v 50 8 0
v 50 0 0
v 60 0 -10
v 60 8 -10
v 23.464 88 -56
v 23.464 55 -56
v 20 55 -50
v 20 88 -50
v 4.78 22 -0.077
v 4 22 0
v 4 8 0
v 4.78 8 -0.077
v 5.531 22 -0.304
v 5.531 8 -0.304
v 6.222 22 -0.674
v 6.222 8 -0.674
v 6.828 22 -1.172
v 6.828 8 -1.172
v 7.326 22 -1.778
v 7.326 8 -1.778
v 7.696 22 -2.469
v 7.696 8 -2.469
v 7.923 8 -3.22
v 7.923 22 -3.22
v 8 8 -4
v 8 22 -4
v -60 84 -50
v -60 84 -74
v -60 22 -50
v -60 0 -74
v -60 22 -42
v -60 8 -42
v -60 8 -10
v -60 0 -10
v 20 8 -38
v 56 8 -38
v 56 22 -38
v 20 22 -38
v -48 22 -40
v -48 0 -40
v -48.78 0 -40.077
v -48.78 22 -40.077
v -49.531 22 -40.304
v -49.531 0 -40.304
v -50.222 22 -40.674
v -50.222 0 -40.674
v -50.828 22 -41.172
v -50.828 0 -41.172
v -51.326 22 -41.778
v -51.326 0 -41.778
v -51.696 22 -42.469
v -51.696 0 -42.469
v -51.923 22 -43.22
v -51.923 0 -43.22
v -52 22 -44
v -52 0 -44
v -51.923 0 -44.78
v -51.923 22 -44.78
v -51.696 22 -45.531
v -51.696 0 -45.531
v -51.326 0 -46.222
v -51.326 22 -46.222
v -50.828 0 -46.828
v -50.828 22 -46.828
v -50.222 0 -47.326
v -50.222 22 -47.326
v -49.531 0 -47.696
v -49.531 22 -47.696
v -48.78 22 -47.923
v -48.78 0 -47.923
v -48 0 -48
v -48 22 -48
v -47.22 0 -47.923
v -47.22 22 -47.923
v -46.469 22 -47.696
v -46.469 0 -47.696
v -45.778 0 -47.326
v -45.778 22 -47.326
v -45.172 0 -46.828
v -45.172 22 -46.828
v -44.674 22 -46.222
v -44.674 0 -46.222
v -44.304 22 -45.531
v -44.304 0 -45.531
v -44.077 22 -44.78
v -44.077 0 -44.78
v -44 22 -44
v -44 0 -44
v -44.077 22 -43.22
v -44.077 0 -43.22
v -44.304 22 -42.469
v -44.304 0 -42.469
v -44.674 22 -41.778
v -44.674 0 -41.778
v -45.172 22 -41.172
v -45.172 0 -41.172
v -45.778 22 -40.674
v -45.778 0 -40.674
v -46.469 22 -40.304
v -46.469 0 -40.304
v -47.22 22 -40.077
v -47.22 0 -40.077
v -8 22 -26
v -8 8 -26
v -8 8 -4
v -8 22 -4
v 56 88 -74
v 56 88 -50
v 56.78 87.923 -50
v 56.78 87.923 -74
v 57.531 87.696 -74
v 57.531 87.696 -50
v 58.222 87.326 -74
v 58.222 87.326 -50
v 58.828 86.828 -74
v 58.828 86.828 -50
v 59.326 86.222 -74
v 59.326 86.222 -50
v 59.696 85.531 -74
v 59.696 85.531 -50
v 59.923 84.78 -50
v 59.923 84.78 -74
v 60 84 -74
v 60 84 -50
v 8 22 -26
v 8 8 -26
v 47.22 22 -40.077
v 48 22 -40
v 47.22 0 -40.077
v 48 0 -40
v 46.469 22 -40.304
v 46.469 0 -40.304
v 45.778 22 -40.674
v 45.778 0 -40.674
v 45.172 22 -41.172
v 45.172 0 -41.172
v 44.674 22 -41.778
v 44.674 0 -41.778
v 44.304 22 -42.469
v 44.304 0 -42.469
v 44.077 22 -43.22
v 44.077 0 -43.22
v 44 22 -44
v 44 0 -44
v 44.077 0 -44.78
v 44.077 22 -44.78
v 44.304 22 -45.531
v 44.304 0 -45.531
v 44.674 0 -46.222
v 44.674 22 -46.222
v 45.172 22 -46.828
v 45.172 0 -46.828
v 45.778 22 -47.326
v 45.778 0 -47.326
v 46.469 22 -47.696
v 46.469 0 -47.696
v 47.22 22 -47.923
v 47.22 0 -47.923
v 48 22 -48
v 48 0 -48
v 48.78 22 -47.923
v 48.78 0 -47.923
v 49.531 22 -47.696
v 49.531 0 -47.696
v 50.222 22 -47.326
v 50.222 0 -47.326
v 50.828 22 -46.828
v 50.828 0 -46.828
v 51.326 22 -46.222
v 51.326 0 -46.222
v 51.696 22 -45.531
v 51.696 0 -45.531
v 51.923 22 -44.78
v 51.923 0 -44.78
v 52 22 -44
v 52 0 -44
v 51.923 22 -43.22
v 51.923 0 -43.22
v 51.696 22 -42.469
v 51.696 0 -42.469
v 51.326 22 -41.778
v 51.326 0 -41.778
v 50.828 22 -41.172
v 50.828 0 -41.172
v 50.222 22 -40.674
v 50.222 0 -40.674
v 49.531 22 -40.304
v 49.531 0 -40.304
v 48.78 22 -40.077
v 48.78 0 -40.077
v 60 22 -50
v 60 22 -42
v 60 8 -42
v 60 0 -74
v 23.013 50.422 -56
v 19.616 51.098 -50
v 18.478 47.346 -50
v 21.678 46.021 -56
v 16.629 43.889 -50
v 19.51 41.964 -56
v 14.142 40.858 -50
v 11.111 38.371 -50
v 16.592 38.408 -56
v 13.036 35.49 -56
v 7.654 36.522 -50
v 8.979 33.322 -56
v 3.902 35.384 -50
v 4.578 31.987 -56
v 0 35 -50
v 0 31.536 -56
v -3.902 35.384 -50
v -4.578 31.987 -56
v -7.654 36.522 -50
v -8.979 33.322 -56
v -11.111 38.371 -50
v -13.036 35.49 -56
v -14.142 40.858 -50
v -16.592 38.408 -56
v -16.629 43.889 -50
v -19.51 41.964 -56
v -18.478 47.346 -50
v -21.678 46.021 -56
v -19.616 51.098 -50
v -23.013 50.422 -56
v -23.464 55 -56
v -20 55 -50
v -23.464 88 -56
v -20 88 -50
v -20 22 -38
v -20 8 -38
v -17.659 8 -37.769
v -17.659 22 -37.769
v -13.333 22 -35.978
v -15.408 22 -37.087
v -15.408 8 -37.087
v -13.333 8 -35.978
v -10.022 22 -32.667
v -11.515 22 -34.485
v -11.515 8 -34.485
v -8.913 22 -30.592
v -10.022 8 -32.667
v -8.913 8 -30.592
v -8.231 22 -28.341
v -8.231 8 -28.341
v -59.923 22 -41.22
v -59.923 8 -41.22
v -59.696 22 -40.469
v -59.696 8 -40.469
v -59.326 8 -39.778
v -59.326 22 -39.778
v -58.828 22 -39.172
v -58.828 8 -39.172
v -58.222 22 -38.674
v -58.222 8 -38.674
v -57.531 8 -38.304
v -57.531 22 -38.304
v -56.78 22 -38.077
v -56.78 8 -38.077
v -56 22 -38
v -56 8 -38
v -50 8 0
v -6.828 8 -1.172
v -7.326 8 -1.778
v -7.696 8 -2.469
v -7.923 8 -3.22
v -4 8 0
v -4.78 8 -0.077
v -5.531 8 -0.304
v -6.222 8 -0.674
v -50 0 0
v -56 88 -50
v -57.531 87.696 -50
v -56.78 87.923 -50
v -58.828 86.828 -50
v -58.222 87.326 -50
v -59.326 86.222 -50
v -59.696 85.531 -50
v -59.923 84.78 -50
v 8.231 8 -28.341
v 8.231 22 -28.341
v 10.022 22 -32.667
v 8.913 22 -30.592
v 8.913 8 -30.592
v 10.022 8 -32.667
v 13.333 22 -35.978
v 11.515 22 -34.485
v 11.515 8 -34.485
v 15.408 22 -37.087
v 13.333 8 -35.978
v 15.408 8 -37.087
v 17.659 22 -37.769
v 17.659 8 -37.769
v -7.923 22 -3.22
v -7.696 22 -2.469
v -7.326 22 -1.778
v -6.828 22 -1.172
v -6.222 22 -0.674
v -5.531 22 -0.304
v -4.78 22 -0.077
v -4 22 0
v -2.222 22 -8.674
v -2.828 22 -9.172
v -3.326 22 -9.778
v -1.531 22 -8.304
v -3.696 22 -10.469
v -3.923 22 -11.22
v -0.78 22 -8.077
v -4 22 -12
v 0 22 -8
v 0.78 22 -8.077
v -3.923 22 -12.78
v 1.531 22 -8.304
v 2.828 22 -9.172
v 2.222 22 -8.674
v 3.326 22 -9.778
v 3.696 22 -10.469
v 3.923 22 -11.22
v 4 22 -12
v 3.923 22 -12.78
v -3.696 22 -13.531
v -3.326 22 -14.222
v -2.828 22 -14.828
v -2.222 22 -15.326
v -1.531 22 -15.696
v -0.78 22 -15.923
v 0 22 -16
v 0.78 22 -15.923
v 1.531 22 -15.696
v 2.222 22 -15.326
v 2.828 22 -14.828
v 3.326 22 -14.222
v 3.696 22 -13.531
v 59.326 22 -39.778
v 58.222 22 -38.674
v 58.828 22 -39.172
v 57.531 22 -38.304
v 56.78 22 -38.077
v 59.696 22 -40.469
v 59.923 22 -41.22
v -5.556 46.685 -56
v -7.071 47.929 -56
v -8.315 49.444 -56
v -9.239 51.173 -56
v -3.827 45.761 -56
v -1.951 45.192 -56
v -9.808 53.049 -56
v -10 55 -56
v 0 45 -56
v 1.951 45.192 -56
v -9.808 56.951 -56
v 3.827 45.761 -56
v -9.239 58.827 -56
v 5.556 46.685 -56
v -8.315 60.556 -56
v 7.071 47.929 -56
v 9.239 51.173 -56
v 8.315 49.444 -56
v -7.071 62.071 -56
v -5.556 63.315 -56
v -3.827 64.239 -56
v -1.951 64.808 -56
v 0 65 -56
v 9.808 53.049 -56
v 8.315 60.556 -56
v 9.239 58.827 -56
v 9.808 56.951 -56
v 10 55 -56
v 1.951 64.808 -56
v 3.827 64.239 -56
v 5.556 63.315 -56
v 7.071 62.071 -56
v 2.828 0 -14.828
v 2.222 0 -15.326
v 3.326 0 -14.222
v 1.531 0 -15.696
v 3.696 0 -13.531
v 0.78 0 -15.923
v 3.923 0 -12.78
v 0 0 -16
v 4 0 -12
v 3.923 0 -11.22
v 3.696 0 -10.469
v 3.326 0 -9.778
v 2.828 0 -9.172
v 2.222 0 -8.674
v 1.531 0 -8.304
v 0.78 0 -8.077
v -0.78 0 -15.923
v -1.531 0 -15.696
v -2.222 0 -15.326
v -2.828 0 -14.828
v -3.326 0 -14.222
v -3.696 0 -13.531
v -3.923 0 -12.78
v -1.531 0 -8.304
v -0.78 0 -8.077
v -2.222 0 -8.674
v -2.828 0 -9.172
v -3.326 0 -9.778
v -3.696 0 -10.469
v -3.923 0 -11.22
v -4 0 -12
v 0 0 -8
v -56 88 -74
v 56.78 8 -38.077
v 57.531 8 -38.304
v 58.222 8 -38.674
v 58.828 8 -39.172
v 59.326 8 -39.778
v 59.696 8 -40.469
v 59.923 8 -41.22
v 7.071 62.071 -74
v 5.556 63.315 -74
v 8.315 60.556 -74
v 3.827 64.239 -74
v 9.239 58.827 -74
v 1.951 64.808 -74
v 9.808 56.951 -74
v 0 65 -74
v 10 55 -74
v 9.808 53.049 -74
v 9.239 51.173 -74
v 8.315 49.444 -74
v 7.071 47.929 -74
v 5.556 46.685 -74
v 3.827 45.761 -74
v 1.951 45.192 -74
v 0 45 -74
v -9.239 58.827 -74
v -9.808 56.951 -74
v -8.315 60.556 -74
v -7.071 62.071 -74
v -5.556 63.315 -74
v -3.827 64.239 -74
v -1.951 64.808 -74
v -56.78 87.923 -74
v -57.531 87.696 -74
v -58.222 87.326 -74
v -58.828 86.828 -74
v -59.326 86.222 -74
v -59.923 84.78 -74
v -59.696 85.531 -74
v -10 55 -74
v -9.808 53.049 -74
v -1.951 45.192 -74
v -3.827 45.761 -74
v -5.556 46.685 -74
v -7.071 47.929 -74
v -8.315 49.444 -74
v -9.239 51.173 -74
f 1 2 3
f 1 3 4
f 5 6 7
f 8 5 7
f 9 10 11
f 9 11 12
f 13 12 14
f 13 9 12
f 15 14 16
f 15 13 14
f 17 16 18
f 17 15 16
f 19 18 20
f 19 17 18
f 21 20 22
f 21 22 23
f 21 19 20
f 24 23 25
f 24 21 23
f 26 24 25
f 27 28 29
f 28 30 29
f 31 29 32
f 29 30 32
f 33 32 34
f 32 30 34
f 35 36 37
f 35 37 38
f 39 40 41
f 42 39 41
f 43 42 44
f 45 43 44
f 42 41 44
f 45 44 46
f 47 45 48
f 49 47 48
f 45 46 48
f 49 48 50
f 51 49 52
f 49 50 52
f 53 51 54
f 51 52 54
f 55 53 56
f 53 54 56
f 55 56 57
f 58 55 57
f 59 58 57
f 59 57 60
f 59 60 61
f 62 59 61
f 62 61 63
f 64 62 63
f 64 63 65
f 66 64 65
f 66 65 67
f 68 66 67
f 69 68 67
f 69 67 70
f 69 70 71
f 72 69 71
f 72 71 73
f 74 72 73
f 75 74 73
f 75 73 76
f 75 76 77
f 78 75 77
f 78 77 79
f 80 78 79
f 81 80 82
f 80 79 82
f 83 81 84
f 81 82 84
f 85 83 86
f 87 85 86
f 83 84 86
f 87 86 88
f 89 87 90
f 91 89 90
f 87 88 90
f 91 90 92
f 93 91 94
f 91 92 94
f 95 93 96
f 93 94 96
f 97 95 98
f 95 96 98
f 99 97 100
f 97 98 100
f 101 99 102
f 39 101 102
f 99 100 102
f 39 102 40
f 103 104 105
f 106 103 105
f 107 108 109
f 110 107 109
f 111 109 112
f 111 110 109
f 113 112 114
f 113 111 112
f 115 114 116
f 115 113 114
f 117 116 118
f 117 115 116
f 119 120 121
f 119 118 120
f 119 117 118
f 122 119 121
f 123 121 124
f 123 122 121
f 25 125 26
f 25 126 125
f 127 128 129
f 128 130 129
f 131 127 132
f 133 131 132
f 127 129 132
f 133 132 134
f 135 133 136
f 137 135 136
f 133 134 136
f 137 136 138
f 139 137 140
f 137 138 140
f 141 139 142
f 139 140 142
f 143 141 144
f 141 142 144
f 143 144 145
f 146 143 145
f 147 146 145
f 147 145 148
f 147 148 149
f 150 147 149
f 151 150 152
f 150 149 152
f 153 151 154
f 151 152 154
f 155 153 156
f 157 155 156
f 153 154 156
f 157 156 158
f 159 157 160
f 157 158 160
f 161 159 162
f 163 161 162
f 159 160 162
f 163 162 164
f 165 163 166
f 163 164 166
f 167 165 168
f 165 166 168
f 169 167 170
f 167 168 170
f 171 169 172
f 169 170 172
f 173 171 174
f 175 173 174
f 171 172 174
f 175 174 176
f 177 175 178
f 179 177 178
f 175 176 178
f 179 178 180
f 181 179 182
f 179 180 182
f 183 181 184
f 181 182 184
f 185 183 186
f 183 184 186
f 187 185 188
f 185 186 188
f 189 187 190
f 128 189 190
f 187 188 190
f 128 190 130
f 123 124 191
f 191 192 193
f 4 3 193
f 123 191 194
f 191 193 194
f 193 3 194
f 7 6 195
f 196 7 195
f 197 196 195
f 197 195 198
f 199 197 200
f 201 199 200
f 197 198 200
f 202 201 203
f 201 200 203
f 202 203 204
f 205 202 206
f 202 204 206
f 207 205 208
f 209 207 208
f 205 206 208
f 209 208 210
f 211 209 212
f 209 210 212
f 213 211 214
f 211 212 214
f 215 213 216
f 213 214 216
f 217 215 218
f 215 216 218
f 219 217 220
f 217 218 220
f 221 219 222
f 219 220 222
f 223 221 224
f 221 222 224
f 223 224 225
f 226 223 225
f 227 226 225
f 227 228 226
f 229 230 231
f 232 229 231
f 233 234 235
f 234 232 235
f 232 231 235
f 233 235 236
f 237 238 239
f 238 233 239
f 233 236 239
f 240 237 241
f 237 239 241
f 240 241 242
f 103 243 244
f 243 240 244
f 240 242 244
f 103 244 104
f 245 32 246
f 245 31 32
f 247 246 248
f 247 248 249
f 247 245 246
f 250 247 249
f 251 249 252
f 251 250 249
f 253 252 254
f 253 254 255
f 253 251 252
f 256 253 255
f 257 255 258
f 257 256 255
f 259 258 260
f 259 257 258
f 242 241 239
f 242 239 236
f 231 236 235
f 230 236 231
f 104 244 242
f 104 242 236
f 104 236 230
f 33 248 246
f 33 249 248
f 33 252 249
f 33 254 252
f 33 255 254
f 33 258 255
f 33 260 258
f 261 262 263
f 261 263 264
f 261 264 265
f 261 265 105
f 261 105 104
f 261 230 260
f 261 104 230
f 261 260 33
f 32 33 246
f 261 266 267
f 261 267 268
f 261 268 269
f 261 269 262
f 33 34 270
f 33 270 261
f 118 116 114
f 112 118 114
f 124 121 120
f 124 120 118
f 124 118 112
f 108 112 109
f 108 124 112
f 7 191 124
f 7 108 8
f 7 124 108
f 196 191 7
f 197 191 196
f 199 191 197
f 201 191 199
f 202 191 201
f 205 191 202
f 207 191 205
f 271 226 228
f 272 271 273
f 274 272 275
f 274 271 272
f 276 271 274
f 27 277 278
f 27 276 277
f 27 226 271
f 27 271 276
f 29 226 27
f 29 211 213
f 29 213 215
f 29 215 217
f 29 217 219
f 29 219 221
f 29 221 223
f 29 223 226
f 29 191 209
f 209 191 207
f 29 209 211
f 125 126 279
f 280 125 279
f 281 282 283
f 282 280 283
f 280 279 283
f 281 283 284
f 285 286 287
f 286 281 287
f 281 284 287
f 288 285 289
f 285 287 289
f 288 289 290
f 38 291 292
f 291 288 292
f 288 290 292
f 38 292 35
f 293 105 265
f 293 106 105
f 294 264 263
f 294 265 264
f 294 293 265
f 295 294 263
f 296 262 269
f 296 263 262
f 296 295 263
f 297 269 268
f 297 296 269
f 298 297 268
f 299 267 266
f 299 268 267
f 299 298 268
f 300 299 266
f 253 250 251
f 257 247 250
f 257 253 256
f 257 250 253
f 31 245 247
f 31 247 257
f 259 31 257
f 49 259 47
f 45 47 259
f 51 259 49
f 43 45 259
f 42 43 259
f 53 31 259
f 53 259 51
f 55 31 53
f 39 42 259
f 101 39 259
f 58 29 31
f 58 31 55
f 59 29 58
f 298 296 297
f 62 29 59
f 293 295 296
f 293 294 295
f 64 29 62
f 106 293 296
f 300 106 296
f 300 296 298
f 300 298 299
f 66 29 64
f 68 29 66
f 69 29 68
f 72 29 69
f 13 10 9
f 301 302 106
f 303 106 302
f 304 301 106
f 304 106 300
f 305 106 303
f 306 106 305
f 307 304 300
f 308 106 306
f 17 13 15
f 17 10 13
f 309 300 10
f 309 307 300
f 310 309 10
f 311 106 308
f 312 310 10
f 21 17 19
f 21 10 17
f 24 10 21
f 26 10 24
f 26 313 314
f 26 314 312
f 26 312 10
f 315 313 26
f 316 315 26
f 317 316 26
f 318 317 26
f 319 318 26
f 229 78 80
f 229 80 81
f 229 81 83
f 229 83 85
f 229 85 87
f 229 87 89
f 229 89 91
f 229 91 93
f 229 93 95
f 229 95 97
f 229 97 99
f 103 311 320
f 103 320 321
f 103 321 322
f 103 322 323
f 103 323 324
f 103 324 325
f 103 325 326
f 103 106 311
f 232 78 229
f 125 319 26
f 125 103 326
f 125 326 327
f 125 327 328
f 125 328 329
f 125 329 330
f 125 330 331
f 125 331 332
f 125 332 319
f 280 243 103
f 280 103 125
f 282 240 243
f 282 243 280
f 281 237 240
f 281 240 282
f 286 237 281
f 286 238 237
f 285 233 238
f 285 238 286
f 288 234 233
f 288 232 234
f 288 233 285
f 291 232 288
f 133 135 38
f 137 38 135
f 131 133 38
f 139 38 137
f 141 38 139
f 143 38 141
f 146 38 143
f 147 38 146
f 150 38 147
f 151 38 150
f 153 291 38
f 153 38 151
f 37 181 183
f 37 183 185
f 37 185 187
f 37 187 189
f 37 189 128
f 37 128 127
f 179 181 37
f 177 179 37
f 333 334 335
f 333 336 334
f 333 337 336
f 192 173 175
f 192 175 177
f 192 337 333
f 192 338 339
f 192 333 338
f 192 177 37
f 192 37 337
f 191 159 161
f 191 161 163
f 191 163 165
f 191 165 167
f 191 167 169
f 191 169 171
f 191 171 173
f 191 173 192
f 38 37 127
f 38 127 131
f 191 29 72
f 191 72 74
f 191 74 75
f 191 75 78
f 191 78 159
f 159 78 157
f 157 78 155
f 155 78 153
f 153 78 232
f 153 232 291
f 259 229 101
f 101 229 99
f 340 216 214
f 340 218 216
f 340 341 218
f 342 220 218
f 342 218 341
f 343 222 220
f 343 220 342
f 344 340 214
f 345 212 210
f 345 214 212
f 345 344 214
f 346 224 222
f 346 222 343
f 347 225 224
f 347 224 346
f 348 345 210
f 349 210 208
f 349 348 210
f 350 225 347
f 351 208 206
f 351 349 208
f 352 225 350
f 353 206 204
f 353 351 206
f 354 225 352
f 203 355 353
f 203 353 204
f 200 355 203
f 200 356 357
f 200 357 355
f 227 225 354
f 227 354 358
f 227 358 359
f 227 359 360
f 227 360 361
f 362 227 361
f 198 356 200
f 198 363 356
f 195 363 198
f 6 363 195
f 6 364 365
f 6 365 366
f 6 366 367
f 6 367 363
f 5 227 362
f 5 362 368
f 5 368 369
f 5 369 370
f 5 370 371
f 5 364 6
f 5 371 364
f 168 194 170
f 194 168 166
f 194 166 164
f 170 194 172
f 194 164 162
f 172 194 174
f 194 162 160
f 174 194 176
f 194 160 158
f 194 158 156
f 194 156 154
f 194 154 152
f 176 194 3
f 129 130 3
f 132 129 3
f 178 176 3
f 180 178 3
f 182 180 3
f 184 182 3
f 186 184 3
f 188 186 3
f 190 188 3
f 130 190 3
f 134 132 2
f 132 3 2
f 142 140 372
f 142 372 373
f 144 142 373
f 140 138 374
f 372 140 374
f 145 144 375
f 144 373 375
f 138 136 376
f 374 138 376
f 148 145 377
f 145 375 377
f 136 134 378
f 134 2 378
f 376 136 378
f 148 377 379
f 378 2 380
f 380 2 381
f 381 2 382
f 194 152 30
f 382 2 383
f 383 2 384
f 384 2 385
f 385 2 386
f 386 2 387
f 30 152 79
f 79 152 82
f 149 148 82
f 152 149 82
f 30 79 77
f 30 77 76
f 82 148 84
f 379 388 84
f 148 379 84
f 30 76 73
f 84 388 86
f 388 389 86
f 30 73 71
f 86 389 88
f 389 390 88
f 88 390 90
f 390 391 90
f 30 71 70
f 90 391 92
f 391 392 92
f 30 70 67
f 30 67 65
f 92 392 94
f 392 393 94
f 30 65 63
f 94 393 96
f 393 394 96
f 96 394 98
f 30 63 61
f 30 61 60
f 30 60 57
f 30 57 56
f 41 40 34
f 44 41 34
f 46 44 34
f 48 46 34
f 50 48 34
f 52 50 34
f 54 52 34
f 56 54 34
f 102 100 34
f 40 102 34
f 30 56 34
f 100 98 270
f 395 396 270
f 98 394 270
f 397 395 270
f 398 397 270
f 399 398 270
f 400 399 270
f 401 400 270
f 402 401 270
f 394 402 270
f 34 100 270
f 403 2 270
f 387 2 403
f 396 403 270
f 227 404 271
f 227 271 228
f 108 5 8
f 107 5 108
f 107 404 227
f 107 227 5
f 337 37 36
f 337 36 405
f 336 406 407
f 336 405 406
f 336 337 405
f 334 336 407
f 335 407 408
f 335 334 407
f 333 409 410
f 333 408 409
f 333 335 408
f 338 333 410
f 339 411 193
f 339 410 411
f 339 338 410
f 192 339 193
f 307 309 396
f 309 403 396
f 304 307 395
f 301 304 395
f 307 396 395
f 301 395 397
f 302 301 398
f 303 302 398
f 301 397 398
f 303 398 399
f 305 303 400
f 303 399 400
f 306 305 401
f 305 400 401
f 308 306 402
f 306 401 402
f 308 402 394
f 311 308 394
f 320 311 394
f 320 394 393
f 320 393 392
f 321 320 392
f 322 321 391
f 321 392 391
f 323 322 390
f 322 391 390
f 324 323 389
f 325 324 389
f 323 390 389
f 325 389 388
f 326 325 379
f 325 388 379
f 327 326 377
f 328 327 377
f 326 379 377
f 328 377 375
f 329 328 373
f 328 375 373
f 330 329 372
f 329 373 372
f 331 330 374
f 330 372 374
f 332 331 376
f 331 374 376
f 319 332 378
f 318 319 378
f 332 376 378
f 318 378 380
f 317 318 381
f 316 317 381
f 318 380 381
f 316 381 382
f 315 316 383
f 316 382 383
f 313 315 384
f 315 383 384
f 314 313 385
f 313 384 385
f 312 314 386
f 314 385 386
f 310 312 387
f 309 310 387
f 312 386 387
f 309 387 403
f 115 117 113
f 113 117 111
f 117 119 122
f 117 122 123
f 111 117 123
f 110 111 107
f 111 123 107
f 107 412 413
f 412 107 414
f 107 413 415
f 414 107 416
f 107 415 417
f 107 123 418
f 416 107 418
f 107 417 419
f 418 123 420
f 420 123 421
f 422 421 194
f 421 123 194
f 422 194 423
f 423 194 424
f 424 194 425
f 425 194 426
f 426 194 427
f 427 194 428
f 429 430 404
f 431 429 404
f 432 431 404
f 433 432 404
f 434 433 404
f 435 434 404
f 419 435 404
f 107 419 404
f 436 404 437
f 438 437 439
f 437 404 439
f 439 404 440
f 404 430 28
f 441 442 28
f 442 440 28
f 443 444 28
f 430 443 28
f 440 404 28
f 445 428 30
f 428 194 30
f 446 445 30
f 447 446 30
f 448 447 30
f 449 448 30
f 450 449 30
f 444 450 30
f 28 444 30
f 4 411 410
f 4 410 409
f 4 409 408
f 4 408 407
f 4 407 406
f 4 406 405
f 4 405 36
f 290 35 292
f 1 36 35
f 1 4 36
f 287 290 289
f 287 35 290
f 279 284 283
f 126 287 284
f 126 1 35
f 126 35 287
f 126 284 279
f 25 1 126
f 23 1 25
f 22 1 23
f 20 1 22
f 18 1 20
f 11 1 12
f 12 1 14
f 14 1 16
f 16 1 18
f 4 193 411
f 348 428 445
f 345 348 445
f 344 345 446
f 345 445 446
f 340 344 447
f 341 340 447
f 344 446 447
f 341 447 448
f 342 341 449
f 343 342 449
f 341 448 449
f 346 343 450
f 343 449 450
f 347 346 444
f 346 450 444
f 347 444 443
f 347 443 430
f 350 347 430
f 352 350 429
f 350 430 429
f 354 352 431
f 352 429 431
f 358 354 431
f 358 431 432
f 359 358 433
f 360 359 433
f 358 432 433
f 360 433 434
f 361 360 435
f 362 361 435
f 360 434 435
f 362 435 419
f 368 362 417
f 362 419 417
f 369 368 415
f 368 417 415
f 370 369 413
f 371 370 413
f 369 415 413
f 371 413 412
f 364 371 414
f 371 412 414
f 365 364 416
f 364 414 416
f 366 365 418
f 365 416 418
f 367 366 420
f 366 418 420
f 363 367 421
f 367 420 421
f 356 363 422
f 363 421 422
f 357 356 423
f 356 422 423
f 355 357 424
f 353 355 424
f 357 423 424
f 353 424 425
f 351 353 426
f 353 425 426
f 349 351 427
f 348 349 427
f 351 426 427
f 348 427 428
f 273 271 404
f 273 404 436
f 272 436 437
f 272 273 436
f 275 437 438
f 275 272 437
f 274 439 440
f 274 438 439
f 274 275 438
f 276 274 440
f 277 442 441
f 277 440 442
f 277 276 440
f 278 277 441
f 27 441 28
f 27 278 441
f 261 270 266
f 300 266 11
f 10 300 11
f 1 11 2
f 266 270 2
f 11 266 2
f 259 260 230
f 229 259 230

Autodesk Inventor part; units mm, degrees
ref_plane "YZ Plane" through (0, 0, 0) normal (1, 0, 0) x (0, 1, 0)
ref_plane "XZ Plane" through (0, 0, 0) normal (0, 1, 0) x (-1, 0, 0)
ref_plane "XY Plane" through (0, 0, 0) normal (0, 0, 1) x (1, 0, 0)
sketch "Sketch1" plane through (0, 0, 0) normal (0, 1, 0) x (-1, 0, 0)
  line L0 (60, -74) -> (-60, -74)
  line L1 (-60, -74) -> (-60, 0)
  line L2 (-60, 0) -> (60, 0)
  line L3 (60, 0) -> (60, -74)
  point P0 (0, 0)
  point P1 (0, 0)
  dimension "d0" = 120
  dimension "d1" = 74
extrude "Extrusion1" add sketch "Sketch1" along normal blind 8
chamfer "Chamfer1" distance 10 angle 45 2 edges at (60, 4, 0) (-60, 4, 0)
sketch "Sketch2" plane through (0, 8, 0) normal (0, 1, 0) x (1, 0, 0)
  line L0 (-50, 0) -> (-60, 10) projected
  line L1 (-50, 0) -> (50, 0) projected
  line L2 (60, 10) -> (60, 74) projected
  line L3 (60, 74) -> (-60, 74) projected
  line L4 (-60, 74) -> (-60, 10) projected
  line L5 (-60, 38) -> (-20, 38)
  line L6 (-8, 26) -> (-8, 0)
  line L7 (-8, 0) -> (-50, 0)
  line L8 (-60, 10) -> (-60, 38)
  arc A0 (-8, 26) -> (-20, 38) centre (-20, 26) ccw
  line L9 (0, 88.8) -> (0, -14.8) construction
  line L10 (50, 0) -> (60, 10)
  line L11 (60, 38) -> (20, 38)
  line L12 (8, 26) -> (8, 0)
  line L13 (8, 0) -> (50, 0)
  line L14 (60, 10) -> (60, 38)
  arc A1 (20, 38) -> (8, 26) centre (20, 26) ccw
  point P0 (0, 0)
  point P1 (8, 0)
  dimension "d7" = 12
  dimension "d8" = 38
  dimension "d9" = 16
extrude "Extrusion2" add sketch "Sketch2" along normal blind 14 contours L6 A0 L5 L4 L3 L2 L11 A1 L12 L1
sketch "Sketch3" plane through (0, 22, 0) normal (0, 1, 0) x (1, 0, 0)
  line L0 (-60, 74) -> (-60, 38) projected
  line L1 (60, 38) -> (60, 74) projected
  line L2 (60, 74) -> (-60, 74) projected
  line L3 (-60, 74) -> (-60, 10) projected
  line L4 (-60, 74) -> (60, 74)
  line L5 (60, 74) -> (60, 50)
  line L6 (60, 50) -> (-60, 50)
  line L7 (-60, 50) -> (-60, 74)
  point P0 (0, 0)
  point P1 (-60, 50)
  dimension "d12" = 24
extrude "Extrusion3" add sketch "Sketch3" along normal blind 66
fillet "Fillet1" radius 4 6 edges at (60, 88, -62) (-60, 88, -62) (-60, 15, -38) (-8, 15, 0) (8, 15, 0) (60, 15, -38)
sketch "Sketch4" plane through (0, 88, 0) normal (0, 1, 0) x (1, 0, 0)
  line L0 (-56, 50) -> (56, 50) projected
  line L1 (-20, 50) -> (-23.4641, 56)
  line L2 (-23.4641, 56) -> (23.4641, 56)
  line L3 (60, 50) -> (-60, 50) projected
  line L4 (23.4641, 56) -> (20, 50)
  line L5 (0, 88.8) -> (0, -14.8) construction
  point P0 (0, 0)
  dimension "d16" = 60
  dimension "d17" = 40
  dimension "d18" = 6
extrude "Extrusion4" cut sketch "Sketch4" against normal blind 33
sketch "Sketch5" plane through (0, 55, 0) normal (0, 1, 0) x (1, 0, 0)
  line L0 (-20, 50) -> (-23.4641, 56) projected
  line L1 (20, 50) -> (-20, 50) projected
  line L2 (-23.4641, 56) -> (23.4641, 56) projected
  line L3 (-20, 50) -> (0, 50)
  line L4 (60, 50) -> (-60, 50) projected
  line L5 (0, 50) -> (0, 56)
  line L6 (0, 56) -> (-23.4641, 56)
  point P0 (0, 0)
revolve "Revolution1" cut sketch "Sketch5" angle 360 about axis through (0, 55, -50) along (0, 0, -1)
sketch "Sketch6" plane through (-23.4641, 88, -56) normal (0, 0, 1) x (1, 0, 0)
  arc A0 (3.4641, -33) -> (43.4641, -33) centre (23.4641, -33) ccw projected
  point P0 (23.4641, -88)
hole "Hole1" at (0, 55, -56) direction (0, 0, -1) diameter 20 end through all
sketch "Sketch7" plane through (0, 22, 0) normal (0, 1, 0) x (1, 0, 0)
  line L0 (-4, 0) -> (4, 0) projected
  line L1 (-50, 0) -> (-4, 0) projected
  line L2 (0, 88.9657) -> (0, -15.7941) construction
  point P0 (0, 0)
  point P1 (-48, 44)
  point P2 (48, 44)
  point P3 (0, 12)
  point P4 (0, 0)
  dimension "d29" = 44
  dimension "d30" = 96
  dimension "d31" = 12
hole "Hole2" at (-48, 22, -44) at (48, 22, -44) at (0, 22, -12) direction (0, -1, 0) diameter 8 end through all
properties part number "Part019. Corner block" material "Steel, Carbon"
